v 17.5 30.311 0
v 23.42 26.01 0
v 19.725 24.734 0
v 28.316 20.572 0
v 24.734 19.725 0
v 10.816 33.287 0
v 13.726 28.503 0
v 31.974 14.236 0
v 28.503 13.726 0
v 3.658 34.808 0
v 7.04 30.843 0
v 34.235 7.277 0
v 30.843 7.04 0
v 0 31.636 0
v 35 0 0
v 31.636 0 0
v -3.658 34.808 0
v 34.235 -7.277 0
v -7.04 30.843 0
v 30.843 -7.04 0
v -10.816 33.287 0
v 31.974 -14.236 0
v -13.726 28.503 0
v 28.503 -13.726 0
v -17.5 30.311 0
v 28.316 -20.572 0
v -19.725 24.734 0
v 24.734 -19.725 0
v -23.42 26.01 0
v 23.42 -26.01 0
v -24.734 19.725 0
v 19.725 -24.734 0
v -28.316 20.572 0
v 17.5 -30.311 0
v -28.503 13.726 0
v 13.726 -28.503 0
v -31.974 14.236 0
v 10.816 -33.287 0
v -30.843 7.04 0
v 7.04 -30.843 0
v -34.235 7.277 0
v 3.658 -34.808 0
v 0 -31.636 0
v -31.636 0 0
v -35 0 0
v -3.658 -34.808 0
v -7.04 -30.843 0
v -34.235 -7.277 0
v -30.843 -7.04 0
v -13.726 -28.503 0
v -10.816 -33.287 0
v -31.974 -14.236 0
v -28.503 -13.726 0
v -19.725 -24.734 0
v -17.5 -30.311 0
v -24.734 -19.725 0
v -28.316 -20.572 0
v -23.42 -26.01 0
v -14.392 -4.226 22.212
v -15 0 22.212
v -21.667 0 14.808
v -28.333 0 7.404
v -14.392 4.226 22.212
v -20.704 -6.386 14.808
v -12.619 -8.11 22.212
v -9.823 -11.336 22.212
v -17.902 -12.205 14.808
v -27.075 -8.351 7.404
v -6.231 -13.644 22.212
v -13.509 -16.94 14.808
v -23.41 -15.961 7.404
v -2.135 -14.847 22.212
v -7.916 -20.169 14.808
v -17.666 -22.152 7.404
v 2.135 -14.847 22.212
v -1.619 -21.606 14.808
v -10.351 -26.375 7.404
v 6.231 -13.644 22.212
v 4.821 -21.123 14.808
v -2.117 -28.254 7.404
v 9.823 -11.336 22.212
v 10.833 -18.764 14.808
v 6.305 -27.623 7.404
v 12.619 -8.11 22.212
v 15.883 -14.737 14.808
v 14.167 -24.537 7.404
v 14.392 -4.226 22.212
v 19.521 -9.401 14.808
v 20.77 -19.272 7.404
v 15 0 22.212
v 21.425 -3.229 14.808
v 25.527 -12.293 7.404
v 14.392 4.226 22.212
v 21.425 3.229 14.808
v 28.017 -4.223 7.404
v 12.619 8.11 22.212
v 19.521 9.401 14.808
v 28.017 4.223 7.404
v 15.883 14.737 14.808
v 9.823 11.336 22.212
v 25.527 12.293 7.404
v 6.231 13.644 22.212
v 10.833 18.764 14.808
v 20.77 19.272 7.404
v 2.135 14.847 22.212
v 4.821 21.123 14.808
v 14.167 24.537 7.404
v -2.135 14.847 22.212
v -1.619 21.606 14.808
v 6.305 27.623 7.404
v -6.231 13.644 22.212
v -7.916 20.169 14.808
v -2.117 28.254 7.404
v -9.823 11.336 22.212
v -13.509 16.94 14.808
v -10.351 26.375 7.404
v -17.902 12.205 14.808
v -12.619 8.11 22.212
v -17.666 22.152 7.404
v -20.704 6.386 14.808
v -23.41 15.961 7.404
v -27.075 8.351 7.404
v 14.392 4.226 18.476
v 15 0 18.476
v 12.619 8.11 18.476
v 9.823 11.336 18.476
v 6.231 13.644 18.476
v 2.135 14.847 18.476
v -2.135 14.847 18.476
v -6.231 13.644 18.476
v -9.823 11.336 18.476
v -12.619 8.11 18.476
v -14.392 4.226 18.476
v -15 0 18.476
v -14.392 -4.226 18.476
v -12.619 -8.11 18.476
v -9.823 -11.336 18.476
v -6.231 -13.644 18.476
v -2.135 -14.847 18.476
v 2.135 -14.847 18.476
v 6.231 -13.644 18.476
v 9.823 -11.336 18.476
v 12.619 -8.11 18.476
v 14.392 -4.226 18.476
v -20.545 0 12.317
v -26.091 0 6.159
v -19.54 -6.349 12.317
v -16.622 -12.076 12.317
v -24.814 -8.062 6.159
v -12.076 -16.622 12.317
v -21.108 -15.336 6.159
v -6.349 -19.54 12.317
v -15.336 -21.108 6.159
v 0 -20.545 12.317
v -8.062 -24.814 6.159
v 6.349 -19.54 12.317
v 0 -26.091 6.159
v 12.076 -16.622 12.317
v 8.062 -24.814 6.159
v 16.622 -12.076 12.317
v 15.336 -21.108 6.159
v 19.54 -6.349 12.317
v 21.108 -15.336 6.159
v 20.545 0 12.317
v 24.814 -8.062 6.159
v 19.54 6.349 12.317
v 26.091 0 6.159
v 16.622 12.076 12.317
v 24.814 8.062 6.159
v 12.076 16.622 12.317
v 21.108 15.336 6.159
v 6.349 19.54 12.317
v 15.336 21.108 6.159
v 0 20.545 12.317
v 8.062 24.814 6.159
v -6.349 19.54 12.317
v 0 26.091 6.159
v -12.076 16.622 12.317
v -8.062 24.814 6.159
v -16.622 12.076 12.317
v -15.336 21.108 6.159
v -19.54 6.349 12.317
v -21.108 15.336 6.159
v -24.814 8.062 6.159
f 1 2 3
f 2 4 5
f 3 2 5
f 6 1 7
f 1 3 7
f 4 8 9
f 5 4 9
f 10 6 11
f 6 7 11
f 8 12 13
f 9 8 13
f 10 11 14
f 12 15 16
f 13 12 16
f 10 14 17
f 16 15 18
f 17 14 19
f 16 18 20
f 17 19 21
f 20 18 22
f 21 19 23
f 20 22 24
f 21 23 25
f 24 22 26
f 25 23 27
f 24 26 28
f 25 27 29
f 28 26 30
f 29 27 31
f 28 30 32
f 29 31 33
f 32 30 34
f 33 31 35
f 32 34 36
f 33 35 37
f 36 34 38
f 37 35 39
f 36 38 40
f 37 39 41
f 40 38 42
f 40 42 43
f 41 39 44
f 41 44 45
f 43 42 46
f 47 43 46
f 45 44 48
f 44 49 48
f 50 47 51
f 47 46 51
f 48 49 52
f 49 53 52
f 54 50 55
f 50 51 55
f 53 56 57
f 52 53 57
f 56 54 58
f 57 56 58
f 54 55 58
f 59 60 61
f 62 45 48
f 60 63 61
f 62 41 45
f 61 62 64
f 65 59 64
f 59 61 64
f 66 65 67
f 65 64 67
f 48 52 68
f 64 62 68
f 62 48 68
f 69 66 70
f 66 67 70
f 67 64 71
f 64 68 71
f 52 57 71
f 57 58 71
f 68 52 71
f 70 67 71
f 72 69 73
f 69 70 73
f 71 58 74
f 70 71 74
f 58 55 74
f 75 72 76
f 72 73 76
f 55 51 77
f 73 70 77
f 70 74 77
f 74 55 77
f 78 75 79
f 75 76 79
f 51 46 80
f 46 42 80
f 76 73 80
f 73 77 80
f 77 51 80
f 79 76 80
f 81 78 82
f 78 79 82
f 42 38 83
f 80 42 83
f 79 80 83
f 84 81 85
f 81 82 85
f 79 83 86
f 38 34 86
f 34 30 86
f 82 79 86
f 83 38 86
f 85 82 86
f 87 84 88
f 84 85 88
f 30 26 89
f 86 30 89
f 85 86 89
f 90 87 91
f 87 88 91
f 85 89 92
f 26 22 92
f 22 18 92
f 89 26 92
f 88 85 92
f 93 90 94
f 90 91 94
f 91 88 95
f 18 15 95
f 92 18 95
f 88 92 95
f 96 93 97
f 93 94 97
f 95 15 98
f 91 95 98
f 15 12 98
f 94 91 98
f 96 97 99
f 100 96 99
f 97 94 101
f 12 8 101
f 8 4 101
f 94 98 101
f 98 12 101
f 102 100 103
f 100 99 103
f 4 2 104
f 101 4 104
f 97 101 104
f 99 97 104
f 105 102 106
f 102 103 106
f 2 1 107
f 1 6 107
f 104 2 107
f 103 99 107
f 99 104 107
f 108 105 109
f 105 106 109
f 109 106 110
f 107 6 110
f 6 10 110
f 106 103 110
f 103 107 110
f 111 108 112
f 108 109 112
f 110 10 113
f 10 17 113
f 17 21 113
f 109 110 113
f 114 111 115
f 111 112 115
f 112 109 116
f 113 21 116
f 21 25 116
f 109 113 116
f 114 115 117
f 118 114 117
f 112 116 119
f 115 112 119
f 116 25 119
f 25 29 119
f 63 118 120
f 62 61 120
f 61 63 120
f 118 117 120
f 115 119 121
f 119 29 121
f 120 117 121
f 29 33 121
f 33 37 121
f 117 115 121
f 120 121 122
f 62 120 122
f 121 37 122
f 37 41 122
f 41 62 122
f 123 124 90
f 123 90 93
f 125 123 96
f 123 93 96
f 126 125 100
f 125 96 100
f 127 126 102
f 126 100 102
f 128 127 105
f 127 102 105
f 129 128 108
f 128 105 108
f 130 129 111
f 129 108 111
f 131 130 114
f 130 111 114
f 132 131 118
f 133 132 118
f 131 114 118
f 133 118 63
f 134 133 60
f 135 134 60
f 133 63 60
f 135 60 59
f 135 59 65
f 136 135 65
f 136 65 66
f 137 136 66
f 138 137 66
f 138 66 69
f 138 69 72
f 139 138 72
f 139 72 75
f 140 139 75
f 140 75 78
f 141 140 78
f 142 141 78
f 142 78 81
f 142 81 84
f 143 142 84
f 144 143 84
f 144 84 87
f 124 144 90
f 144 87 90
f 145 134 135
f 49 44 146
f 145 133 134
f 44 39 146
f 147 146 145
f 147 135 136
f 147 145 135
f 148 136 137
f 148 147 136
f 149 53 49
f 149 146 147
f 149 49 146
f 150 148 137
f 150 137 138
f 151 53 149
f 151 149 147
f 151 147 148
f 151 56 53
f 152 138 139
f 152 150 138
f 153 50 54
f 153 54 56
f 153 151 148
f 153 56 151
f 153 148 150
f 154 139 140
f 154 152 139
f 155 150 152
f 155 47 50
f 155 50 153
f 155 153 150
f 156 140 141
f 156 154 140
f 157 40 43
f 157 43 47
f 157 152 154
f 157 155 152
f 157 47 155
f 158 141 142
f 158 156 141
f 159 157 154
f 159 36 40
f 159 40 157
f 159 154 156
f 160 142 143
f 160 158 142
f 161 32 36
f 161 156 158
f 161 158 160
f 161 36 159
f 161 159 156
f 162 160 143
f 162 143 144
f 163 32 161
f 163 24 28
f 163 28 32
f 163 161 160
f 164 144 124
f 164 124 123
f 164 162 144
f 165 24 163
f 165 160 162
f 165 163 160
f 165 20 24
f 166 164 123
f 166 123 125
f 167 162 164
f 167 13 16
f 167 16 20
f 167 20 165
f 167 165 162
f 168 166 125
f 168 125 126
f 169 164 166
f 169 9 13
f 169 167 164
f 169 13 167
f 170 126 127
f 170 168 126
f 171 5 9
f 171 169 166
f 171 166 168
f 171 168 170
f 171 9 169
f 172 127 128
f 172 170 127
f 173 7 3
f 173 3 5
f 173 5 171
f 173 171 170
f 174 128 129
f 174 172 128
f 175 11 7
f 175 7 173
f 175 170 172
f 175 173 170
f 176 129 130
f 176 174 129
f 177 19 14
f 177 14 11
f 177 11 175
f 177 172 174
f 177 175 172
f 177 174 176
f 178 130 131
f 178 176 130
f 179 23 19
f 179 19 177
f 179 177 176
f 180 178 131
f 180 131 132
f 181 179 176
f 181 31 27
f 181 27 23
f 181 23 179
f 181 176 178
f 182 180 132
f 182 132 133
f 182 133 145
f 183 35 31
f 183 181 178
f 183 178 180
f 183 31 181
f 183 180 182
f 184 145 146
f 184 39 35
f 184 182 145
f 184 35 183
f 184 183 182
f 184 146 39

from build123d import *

# Parameters (mm, degrees)
F2_T      = -2.5
F1_FACE_R = 15
F3_DEPTH  = 25


with BuildPart() as f1:
    # F0 (on Front) → F1 (revolve)
    with BuildSketch(Plane.XZ):
        Polygon((0, 0), (0, 22.21225), (-15, 22.21225), (-35, 0), align=None)
    revolve(axis=Axis((0, 0, 30.702899), (0, 0, 1)))

    # F2
    f2_openings = [f1.faces().sort_by_distance(p)[0] for p in [
        (0, 0, 0),
    ]]
    offset(amount=F2_T, openings=f2_openings)

    # F1_face (on face) → F3 (cut)
    with BuildSketch(Plane.XY.offset(22.21225)):
        Circle(F1_FACE_R)
    extrude(amount=-F3_DEPTH, mode=Mode.SUBTRACT)


solid = f1.part
